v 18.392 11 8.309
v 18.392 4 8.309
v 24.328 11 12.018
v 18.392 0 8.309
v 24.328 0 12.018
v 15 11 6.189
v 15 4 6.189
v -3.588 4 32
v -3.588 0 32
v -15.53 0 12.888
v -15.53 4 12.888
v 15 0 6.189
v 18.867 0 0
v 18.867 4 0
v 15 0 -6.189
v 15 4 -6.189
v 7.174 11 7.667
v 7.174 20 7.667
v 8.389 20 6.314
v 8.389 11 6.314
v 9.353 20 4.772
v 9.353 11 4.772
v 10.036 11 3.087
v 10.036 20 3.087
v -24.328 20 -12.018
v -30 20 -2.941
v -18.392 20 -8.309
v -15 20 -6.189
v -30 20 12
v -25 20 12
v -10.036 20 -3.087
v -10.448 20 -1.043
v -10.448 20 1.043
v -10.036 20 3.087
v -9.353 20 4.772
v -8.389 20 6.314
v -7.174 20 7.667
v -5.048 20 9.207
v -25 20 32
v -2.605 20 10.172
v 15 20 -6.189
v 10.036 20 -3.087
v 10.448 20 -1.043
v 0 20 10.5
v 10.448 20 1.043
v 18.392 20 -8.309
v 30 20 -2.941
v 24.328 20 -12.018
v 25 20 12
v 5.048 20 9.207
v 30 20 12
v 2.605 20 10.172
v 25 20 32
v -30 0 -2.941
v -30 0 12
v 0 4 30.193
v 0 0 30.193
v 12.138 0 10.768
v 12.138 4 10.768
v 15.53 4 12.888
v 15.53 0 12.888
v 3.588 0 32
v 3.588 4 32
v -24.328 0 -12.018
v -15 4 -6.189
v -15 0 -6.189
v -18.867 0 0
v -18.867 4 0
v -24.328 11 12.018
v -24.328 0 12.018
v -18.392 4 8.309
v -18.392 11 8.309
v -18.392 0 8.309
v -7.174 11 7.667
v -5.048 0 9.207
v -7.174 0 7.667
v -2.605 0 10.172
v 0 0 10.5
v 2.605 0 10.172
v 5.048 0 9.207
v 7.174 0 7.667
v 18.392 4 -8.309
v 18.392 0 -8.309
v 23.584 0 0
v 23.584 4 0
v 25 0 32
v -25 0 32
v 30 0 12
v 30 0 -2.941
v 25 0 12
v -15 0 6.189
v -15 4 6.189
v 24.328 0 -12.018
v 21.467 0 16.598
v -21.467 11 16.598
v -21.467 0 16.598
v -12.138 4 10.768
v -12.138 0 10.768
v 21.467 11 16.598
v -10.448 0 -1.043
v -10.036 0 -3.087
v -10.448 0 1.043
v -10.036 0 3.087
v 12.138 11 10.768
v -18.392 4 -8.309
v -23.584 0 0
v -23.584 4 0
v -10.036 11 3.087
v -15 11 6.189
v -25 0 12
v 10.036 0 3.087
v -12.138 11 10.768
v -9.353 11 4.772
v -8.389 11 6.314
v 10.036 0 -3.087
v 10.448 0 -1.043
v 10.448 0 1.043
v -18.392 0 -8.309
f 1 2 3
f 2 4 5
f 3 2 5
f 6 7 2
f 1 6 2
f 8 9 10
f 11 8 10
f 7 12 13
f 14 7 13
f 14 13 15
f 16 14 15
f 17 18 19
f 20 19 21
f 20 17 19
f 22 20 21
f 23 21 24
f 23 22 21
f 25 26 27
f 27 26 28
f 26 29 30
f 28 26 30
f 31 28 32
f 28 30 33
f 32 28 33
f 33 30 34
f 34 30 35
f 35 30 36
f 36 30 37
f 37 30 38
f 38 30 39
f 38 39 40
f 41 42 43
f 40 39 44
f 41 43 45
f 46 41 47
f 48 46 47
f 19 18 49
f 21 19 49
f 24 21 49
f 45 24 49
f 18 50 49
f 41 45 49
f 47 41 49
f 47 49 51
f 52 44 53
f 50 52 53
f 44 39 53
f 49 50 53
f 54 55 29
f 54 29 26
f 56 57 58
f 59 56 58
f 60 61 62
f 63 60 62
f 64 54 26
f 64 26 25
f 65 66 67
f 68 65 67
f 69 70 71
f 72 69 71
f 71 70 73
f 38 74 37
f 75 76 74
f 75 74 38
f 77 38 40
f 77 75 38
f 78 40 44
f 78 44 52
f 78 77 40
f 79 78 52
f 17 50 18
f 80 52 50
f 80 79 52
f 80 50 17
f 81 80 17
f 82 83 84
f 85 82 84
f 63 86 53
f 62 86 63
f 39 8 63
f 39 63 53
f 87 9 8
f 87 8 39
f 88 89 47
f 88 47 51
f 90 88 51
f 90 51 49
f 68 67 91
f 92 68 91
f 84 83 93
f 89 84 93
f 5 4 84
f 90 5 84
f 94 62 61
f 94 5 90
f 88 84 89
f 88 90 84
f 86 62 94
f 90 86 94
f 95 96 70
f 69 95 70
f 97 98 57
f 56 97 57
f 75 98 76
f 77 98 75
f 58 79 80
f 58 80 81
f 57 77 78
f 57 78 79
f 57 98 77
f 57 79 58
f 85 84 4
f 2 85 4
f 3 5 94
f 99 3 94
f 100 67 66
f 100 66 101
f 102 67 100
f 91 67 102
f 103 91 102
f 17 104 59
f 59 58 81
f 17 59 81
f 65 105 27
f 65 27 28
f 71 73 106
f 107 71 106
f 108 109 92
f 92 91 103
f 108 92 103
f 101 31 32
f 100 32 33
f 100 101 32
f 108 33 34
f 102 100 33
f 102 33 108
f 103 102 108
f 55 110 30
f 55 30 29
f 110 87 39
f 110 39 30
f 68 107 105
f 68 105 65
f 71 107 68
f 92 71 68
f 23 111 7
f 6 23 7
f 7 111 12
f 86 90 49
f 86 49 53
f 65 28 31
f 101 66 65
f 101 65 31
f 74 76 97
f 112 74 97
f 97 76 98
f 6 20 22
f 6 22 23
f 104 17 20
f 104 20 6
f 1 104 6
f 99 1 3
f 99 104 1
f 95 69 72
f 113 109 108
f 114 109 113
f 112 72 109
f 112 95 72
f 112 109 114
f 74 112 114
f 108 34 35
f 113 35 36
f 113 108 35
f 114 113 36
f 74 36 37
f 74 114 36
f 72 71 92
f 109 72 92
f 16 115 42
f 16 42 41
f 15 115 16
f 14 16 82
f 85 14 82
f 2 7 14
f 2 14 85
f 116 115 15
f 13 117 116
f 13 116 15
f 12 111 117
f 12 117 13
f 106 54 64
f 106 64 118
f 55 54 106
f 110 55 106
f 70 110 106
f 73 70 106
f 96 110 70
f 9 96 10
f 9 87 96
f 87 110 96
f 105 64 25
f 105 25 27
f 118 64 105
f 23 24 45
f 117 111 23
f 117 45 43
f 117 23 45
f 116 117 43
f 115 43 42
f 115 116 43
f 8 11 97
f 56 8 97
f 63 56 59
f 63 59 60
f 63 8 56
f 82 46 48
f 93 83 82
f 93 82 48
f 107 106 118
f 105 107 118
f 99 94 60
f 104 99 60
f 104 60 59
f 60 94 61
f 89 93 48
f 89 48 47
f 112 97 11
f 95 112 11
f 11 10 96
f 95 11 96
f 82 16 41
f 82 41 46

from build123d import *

# Parameters (mm, degrees)
F1_DEPTH = 20
F2_DEPTH = 11
F3_DEPTH = 4


with BuildPart() as f1:
    # F0 (on Front) → F1 (new body)
    with BuildSketch(Plane.XZ):
        with BuildLine():
            ThreePointArc((10.0358588078, 3.0873189), (10.5, 0), (10.0358588078, -3.0873189))
            Line((10.0358588078, -3.0873189), (14.9995515519, -6.1889783681))
            Line((14.9995515519, -6.1889783681), (18.8668544538, 0))
            Line((18.8668544538, 0), (14.9995515519, 6.1889783681))
            Line((14.9995515519, 6.1889783681), (10.0358588078, 3.0873189))
        make_face()
        with BuildLine():
            ThreePointArc((7.1742947809, 7.6667786192), (8.9045050096, 5.5641522744), (10.0358588078, 3.0873189))
            Line((10.0358588078, 3.0873189), (14.9995515519, 6.1889783681))
            Line((14.9995515519, 6.1889783681), (12.1379875251, 10.7684380874))
            Line((12.1379875251, 10.7684380874), (7.1742947809, 7.6667786192))
        make_face()
        Polygon((18.8668544538, 0), (14.9995515519, -6.1889783681), (18.3917439366, -8.308655425), (23.5835680672, 0), (18.3917439366, 8.308655425), (14.9995515519, 6.1889783681), align=None)
        with BuildLine():
            ThreePointArc((-7.1742947809, 7.6667786192), (0, 10.5), (7.1742947809, 7.6667786192))
            Line((7.1742947809, 7.6667786192), (12.1379875251, 10.7684380874))
            Line((12.1379875251, 10.7684380874), (0, 30.1932786368))
            Line((0, 30.1932786368), (-12.1379875251, 10.7684380874))
            Line((-12.1379875251, 10.7684380874), (-7.1742947809, 7.6667786192))
        make_face()
        Polygon((23.5835680672, 0), (18.3917439366, -8.308655425), (24.3280806097, -12.0180902747), (30, -2.9411218284), (30, 12), (25, 12), (25, 32), (3.5877488061, 32), (15.5301799097, 12.8881151443), (21.4665165828, 16.5975499939), (24.3280806097, 12.0180902747), (18.3917439366, 8.308655425), align=None)
        with BuildLine():
            ThreePointArc((-10.0358588078, 3.0873189), (-8.9045050096, 5.5641522744), (-7.1742947809, 7.6667786192))
            Line((-7.1742947809, 7.6667786192), (-12.1379875251, 10.7684380874))
            Line((-12.1379875251, 10.7684380874), (-14.9995515519, 6.1889783681))
            Line((-14.9995515519, 6.1889783681), (-10.0358588078, 3.0873189))
        make_face()
        Polygon((0, 30.1932786368), (12.1379875251, 10.7684380874), (15.5301799097, 12.8881151443), (3.5877488061, 32), (0, 32), (-3.5877488061, 32), (-15.5301799097, 12.8881151443), (-12.1379875251, 10.7684380874), align=None)
        with BuildLine():
            ThreePointArc((-10.0358588078, -3.0873189), (-10.5, 0), (-10.0358588078, 3.0873189))
            Line((-10.0358588078, 3.0873189), (-14.9995515519, 6.1889783681))
            Line((-14.9995515519, 6.1889783681), (-18.8668544538, 0))
            Line((-18.8668544538, 0), (-14.9995515519, -6.1889783681))
            Line((-14.9995515519, -6.1889783681), (-10.0358588078, -3.0873189))
        make_face()
        Polygon((-18.8668544538, 0), (-14.9995515519, 6.1889783681), (-18.3917439366, 8.308655425), (-23.5835680672, 0), (-18.3917439366, -8.308655425), (-14.9995515519, -6.1889783681), align=None)
        Polygon((-21.4665165828, 16.5975499939), (-15.5301799097, 12.8881151443), (-3.5877488061, 32), (-25, 32), (-25, 12), (-30, 12), (-30, -2.9411218284), (-24.3280806097, -12.0180902747), (-18.3917439366, -8.308655425), (-23.5835680672, 0), (-18.3917439366, 8.308655425), (-24.3280806097, 12.0180902747), align=None)
        Polygon((15.5301799097, 12.8881151443), (18.3917439366, 8.308655425), (24.3280806097, 12.0180902747), (21.4665165828, 16.5975499939), align=None)
        Polygon((12.1379875251, 10.7684380874), (14.9995515519, 6.1889783681), (18.3917439366, 8.308655425), (15.5301799097, 12.8881151443), align=None)
        Polygon((-14.9995515519, 6.1889783681), (-12.1379875251, 10.7684380874), (-15.5301799097, 12.8881151443), (-18.3917439366, 8.308655425), align=None)
        Polygon((-18.3917439366, 8.308655425), (-15.5301799097, 12.8881151443), (-21.4665165828, 16.5975499939), (-24.3280806097, 12.0180902747), align=None)
    extrude(amount=-F1_DEPTH)

    # F0 (on Front) → F2 (cut)
    with BuildSketch(Plane.XZ):
        Polygon((15.5301799097, 12.8881151443), (18.3917439366, 8.308655425), (24.3280806097, 12.0180902747), (21.4665165828, 16.5975499939), align=None)
        Polygon((12.1379875251, 10.7684380874), (14.9995515519, 6.1889783681), (18.3917439366, 8.308655425), (15.5301799097, 12.8881151443), align=None)
        with BuildLine():
            ThreePointArc((7.1742947809, 7.6667786192), (8.9045050096, 5.5641522744), (10.0358588078, 3.0873189))
            Line((10.0358588078, 3.0873189), (14.9995515519, 6.1889783681))
            Line((14.9995515519, 6.1889783681), (12.1379875251, 10.7684380874))
            Line((12.1379875251, 10.7684380874), (7.1742947809, 7.6667786192))
        make_face()
        Polygon((-14.9995515519, 6.1889783681), (-12.1379875251, 10.7684380874), (-15.5301799097, 12.8881151443), (-18.3917439366, 8.308655425), align=None)
        with BuildLine():
            ThreePointArc((-10.0358588078, 3.0873189), (-8.9045050096, 5.5641522744), (-7.1742947809, 7.6667786192))
            Line((-7.1742947809, 7.6667786192), (-12.1379875251, 10.7684380874))
            Line((-12.1379875251, 10.7684380874), (-14.9995515519, 6.1889783681))
            Line((-14.9995515519, 6.1889783681), (-10.0358588078, 3.0873189))
        make_face()
        Polygon((-18.3917439366, 8.308655425), (-15.5301799097, 12.8881151443), (-21.4665165828, 16.5975499939), (-24.3280806097, 12.0180902747), align=None)
    extrude(amount=-F2_DEPTH, mode=Mode.SUBTRACT)

    # F0 (on Front) → F3 (cut)
    with BuildSketch(Plane.XZ):
        Polygon((-18.8668544538, 0), (-14.9995515519, 6.1889783681), (-18.3917439366, 8.308655425), (-23.5835680672, 0), (-18.3917439366, -8.308655425), (-14.9995515519, -6.1889783681), align=None)
        Polygon((0, 30.1932786368), (12.1379875251, 10.7684380874), (15.5301799097, 12.8881151443), (3.5877488061, 32), (0, 32), (-3.5877488061, 32), (-15.5301799097, 12.8881151443), (-12.1379875251, 10.7684380874), align=None)
        Polygon((18.8668544538, 0), (14.9995515519, -6.1889783681), (18.3917439366, -8.308655425), (23.5835680672, 0), (18.3917439366, 8.308655425), (14.9995515519, 6.1889783681), align=None)
    extrude(amount=-F3_DEPTH, mode=Mode.SUBTRACT)


solid = f1.part
